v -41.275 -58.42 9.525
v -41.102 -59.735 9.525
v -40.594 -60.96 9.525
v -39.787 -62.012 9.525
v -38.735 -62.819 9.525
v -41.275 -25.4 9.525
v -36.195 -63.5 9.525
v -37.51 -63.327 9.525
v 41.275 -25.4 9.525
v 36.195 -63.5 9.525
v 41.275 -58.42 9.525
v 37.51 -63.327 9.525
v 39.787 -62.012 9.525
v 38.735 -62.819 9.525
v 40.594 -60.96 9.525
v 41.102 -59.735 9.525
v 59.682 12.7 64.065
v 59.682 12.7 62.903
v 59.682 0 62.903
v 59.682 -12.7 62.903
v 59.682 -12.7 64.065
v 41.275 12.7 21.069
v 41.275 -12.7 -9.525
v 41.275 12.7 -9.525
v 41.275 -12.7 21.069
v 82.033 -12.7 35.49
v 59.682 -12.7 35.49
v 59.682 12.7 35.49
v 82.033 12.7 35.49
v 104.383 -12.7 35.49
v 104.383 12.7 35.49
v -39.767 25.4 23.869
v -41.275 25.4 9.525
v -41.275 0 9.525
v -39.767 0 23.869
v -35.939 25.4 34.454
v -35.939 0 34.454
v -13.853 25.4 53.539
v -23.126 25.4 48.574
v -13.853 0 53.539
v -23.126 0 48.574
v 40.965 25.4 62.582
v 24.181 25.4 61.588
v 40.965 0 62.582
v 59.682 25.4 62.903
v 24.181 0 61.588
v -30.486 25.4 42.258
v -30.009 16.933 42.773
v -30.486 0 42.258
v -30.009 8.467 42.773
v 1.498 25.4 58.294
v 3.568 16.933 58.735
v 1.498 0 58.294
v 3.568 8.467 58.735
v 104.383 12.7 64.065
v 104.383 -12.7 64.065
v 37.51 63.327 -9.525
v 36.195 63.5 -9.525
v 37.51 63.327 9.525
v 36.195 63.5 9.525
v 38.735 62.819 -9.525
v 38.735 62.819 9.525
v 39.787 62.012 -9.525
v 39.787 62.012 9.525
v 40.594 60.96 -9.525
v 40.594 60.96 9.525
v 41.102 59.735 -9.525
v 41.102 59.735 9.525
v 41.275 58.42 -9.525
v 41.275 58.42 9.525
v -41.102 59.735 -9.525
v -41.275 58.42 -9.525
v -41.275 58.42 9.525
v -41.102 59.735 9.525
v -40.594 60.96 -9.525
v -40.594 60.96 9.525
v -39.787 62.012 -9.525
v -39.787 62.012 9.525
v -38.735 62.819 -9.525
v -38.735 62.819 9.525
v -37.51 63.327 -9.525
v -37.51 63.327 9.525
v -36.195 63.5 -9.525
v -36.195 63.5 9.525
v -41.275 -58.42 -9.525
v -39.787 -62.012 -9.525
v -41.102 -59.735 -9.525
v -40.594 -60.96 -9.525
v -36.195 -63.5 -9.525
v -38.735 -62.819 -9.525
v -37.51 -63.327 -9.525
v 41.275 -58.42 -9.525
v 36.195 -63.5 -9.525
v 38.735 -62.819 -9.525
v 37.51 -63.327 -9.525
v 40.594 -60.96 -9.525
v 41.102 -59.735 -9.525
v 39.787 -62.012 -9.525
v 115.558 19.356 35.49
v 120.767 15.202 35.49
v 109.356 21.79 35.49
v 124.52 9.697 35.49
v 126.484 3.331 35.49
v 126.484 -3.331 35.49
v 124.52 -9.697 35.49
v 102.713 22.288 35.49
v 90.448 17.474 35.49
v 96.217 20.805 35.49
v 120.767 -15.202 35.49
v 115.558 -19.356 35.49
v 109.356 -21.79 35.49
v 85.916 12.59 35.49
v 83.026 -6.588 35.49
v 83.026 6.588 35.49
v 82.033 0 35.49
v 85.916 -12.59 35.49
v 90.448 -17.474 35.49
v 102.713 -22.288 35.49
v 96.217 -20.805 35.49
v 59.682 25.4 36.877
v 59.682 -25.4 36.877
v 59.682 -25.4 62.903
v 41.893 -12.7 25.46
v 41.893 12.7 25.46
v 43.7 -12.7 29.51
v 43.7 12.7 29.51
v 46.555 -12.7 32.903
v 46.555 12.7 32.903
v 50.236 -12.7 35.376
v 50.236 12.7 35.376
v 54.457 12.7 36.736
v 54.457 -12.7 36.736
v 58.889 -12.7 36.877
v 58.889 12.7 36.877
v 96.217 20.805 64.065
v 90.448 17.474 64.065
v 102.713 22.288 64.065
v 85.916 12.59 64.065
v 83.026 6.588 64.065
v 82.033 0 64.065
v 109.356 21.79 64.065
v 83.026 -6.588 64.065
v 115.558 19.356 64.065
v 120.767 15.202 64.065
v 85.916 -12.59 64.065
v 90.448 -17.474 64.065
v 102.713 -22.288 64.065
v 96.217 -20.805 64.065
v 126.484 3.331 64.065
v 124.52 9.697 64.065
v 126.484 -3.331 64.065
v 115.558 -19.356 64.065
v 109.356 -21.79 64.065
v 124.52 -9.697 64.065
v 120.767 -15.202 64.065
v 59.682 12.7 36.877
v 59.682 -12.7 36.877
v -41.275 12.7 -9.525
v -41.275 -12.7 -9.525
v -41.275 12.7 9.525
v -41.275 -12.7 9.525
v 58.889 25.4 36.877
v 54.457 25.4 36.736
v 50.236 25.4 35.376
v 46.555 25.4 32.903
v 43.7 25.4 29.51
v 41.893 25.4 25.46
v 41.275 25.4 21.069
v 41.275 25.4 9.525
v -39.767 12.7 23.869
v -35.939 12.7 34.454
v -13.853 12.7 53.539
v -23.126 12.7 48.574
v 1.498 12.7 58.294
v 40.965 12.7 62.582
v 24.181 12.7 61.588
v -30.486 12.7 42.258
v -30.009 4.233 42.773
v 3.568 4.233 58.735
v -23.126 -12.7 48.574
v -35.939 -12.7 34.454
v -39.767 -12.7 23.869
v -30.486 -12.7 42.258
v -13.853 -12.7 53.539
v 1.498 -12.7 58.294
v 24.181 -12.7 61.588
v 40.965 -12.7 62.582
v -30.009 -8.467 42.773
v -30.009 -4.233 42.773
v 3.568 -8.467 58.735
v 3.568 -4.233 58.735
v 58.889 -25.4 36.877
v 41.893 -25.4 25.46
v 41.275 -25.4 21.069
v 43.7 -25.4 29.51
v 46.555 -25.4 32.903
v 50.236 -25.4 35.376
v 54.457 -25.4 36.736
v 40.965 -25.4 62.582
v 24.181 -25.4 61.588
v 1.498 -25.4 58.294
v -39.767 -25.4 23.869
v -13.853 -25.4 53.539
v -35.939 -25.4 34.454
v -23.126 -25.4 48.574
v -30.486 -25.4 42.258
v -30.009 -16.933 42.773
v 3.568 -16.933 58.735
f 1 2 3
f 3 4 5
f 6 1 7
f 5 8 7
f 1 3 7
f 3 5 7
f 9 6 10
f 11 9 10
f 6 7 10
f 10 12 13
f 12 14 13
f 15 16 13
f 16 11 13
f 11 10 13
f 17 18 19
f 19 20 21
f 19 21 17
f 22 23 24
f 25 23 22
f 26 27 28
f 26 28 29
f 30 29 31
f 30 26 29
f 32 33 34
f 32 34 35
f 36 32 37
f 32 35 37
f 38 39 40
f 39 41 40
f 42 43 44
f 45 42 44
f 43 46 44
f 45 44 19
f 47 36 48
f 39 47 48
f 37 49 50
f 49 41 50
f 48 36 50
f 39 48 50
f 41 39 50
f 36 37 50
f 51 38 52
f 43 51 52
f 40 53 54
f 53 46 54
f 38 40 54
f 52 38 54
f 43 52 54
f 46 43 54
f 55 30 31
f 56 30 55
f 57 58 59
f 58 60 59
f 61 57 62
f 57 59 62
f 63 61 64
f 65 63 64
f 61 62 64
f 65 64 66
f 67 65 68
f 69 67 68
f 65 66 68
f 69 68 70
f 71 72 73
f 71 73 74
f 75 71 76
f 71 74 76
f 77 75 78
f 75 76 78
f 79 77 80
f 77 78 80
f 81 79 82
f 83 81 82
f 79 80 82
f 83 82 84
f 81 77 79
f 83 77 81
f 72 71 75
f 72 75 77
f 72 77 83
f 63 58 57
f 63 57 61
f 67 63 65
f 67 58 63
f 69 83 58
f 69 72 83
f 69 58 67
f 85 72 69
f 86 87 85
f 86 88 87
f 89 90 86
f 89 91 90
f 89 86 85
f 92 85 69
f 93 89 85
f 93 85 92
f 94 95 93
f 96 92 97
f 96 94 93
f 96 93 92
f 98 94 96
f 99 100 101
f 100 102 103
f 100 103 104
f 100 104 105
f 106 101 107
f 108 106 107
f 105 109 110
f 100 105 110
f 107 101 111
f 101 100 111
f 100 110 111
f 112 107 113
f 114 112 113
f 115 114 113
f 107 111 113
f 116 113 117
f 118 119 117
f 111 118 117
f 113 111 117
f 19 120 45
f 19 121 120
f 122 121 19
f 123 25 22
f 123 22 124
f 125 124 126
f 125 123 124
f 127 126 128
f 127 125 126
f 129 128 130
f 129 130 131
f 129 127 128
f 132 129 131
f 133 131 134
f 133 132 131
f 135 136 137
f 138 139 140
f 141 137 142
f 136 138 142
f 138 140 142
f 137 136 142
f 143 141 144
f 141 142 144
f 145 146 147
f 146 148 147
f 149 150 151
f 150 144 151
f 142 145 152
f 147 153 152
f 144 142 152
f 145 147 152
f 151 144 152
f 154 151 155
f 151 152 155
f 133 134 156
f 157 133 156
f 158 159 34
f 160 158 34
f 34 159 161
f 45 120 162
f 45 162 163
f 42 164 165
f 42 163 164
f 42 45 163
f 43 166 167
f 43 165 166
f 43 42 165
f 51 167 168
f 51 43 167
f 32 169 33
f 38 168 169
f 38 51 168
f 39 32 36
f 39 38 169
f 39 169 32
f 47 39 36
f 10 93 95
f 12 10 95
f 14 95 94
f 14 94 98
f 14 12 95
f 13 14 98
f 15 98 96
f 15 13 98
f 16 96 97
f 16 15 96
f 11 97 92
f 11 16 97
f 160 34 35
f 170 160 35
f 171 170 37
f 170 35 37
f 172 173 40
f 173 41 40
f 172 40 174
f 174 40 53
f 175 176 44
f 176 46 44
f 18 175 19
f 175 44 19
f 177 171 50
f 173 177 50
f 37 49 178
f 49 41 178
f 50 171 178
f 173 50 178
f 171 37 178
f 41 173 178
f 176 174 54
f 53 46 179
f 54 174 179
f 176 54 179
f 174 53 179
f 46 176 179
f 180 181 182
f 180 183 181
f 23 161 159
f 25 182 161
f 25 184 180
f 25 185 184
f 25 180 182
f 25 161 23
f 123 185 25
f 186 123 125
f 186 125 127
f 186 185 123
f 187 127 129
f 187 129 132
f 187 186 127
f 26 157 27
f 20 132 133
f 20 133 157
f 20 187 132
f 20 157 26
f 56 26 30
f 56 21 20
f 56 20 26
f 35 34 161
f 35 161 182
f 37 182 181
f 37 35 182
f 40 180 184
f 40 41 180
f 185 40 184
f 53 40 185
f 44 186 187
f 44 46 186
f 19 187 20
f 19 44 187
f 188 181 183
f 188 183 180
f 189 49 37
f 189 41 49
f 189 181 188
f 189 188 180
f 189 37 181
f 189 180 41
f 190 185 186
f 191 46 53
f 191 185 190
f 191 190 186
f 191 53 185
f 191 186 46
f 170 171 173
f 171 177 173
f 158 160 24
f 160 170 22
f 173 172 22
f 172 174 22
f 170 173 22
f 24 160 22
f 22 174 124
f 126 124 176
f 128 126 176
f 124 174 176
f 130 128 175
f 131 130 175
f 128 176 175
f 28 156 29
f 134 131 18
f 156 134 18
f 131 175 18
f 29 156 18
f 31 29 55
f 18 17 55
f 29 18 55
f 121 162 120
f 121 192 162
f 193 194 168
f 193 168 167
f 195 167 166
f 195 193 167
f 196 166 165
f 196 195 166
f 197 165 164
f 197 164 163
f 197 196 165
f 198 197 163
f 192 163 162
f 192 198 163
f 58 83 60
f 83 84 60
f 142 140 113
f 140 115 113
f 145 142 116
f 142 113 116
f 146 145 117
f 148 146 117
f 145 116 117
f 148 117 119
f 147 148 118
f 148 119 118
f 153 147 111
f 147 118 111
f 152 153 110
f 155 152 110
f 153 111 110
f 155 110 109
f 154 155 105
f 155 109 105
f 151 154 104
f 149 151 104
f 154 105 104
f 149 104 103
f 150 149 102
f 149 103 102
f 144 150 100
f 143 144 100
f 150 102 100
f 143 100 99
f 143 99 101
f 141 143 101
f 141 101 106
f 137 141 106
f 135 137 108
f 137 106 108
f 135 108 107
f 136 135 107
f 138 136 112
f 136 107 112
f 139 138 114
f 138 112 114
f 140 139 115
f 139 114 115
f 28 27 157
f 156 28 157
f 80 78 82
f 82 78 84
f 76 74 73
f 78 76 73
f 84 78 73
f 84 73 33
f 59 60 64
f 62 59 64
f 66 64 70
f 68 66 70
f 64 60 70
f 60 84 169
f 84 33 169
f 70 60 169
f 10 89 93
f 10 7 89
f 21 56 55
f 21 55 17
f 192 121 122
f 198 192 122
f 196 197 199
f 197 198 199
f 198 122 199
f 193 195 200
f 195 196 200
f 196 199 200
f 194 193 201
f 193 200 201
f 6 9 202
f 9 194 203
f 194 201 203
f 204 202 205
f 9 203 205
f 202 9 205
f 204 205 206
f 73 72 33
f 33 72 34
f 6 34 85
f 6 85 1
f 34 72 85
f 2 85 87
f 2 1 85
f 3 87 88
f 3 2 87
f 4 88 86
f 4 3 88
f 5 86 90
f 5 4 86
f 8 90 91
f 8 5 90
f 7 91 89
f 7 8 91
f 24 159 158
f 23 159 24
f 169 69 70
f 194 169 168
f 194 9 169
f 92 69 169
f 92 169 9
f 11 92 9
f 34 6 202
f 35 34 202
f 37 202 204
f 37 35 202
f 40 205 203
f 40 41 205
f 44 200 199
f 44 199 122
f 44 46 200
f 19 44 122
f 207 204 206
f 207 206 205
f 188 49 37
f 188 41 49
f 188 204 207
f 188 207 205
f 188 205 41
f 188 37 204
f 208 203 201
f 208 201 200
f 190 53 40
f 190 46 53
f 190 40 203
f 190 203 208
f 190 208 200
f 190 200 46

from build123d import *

# Parameters (mm, degrees)
F0_W     = 82.55
F0_H     = 19.05
F1_DEPTH = 63.5
F2_DEPTH = 25.4
F4_R     = 5.08
F0_W_2   = 22.3502442241
F0_H_2   = 26.0258951836
F0_H_3   = 1.1622799838
F0_H_4   = 1.3868248326
F5_DEPTH = 12.7


# Not quite as in the source:
# - a feature names something its author has since deleted; it is built from what else it names


with BuildPart() as f1:
    # F0 (on Front) → F1 (new body, symmetric)
    with BuildSketch(Plane.XZ):
        Rectangle(F0_W, F0_H)
    extrude(amount=F1_DEPTH, both=True)

    # F0 (on Front) → F2 (join, symmetric)
    with BuildSketch(Plane.XZ):
        with BuildLine():
            add(Edge.make_bspline(
                [(-41.275, 9.525), (-41.0884097219, 53.2467439771), (-7.776630111, 62.8007799387), (59.6824064851, 62.9030779754)],
                knots=[0, 0, 0, 0, 114.1998998798, 114.1998998798, 114.1998998798, 114.1998998798], degree=3))
            Line((-41.275, 9.525), (41.275, 9.525))
            Line((41.275, 9.525), (41.275, 21.0693579674))
            ThreePointArc((41.275, 21.0693579674), (46.5551227902, 32.9028879626), (58.8886992965, 36.8771827918))
            Line((58.8886992965, 36.8771827918), (59.6824064851, 36.8771827918))
            Line((59.6824064851, 36.8771827918), (59.6824064851, 62.9030779754))
        make_face()
    extrude(amount=F2_DEPTH, both=True)

    # F4
    f4_edges = [f1.edges().sort_by_distance(p)[0] for p in [
        (41.275, -63.5, 0),
        (-41.275, -63.5, 0),
        (41.275, 63.5, 0),
        (-41.275, 63.5, 0),
    ]]
    fillet(f4_edges, radius=F4_R)


with BuildPart() as f3:
    # F0 (on Front) → F3 (revolve)
    with BuildSketch(Plane.XZ):
        Polygon((82.0326507092, 64.0653579593), (82.0326507092, 62.9030779754), (82.0326507092, 36.8771827918), (82.0326507092, 35.4903579593), (104.3828949332, 35.4903579593), (104.3828949332, 64.0653579593), align=None)
    revolve(axis=Axis((104.3828949332, 0, 49.7778579593), (0, 0, 1)))


with BuildPart() as f5:
    # F0 (on Front) → F5 (new body, symmetric)
    with BuildSketch(Plane.XZ):
        Rectangle(F0_W, F0_H)
        with BuildLine():
            add(Edge.make_bspline(
                [(-41.275, 9.525), (-41.0884097219, 53.2467439771), (-7.776630111, 62.8007799387), (59.6824064851, 62.9030779754)],
                knots=[0, 0, 0, 0, 114.1998998798, 114.1998998798, 114.1998998798, 114.1998998798], degree=3))
            Line((-41.275, 9.525), (41.275, 9.525))
            Line((41.275, 9.525), (41.275, 21.0693579674))
            ThreePointArc((41.275, 21.0693579674), (46.5551227902, 32.9028879626), (58.8886992965, 36.8771827918))
            Line((58.8886992965, 36.8771827918), (59.6824064851, 36.8771827918))
            Line((59.6824064851, 36.8771827918), (59.6824064851, 62.9030779754))
        make_face()
        with Locations((70.8575285971, 49.8901303836)):
            Rectangle(F0_W_2, F0_H_2)
        with Locations((70.8575285971, 63.4842179674)):
            Rectangle(F0_W_2, F0_H_3)
        with Locations((70.8575285971, 36.1837703755)):
            Rectangle(F0_W_2, F0_H_4)
        Polygon((82.0326507092, 64.0653579593), (82.0326507092, 62.9030779754), (82.0326507092, 36.8771827918), (82.0326507092, 35.4903579593), (104.3828949332, 35.4903579593), (104.3828949332, 64.0653579593), align=None)
    extrude(amount=F5_DEPTH, both=True)


solid = Compound([f1.part, f3.part, f5.part])
